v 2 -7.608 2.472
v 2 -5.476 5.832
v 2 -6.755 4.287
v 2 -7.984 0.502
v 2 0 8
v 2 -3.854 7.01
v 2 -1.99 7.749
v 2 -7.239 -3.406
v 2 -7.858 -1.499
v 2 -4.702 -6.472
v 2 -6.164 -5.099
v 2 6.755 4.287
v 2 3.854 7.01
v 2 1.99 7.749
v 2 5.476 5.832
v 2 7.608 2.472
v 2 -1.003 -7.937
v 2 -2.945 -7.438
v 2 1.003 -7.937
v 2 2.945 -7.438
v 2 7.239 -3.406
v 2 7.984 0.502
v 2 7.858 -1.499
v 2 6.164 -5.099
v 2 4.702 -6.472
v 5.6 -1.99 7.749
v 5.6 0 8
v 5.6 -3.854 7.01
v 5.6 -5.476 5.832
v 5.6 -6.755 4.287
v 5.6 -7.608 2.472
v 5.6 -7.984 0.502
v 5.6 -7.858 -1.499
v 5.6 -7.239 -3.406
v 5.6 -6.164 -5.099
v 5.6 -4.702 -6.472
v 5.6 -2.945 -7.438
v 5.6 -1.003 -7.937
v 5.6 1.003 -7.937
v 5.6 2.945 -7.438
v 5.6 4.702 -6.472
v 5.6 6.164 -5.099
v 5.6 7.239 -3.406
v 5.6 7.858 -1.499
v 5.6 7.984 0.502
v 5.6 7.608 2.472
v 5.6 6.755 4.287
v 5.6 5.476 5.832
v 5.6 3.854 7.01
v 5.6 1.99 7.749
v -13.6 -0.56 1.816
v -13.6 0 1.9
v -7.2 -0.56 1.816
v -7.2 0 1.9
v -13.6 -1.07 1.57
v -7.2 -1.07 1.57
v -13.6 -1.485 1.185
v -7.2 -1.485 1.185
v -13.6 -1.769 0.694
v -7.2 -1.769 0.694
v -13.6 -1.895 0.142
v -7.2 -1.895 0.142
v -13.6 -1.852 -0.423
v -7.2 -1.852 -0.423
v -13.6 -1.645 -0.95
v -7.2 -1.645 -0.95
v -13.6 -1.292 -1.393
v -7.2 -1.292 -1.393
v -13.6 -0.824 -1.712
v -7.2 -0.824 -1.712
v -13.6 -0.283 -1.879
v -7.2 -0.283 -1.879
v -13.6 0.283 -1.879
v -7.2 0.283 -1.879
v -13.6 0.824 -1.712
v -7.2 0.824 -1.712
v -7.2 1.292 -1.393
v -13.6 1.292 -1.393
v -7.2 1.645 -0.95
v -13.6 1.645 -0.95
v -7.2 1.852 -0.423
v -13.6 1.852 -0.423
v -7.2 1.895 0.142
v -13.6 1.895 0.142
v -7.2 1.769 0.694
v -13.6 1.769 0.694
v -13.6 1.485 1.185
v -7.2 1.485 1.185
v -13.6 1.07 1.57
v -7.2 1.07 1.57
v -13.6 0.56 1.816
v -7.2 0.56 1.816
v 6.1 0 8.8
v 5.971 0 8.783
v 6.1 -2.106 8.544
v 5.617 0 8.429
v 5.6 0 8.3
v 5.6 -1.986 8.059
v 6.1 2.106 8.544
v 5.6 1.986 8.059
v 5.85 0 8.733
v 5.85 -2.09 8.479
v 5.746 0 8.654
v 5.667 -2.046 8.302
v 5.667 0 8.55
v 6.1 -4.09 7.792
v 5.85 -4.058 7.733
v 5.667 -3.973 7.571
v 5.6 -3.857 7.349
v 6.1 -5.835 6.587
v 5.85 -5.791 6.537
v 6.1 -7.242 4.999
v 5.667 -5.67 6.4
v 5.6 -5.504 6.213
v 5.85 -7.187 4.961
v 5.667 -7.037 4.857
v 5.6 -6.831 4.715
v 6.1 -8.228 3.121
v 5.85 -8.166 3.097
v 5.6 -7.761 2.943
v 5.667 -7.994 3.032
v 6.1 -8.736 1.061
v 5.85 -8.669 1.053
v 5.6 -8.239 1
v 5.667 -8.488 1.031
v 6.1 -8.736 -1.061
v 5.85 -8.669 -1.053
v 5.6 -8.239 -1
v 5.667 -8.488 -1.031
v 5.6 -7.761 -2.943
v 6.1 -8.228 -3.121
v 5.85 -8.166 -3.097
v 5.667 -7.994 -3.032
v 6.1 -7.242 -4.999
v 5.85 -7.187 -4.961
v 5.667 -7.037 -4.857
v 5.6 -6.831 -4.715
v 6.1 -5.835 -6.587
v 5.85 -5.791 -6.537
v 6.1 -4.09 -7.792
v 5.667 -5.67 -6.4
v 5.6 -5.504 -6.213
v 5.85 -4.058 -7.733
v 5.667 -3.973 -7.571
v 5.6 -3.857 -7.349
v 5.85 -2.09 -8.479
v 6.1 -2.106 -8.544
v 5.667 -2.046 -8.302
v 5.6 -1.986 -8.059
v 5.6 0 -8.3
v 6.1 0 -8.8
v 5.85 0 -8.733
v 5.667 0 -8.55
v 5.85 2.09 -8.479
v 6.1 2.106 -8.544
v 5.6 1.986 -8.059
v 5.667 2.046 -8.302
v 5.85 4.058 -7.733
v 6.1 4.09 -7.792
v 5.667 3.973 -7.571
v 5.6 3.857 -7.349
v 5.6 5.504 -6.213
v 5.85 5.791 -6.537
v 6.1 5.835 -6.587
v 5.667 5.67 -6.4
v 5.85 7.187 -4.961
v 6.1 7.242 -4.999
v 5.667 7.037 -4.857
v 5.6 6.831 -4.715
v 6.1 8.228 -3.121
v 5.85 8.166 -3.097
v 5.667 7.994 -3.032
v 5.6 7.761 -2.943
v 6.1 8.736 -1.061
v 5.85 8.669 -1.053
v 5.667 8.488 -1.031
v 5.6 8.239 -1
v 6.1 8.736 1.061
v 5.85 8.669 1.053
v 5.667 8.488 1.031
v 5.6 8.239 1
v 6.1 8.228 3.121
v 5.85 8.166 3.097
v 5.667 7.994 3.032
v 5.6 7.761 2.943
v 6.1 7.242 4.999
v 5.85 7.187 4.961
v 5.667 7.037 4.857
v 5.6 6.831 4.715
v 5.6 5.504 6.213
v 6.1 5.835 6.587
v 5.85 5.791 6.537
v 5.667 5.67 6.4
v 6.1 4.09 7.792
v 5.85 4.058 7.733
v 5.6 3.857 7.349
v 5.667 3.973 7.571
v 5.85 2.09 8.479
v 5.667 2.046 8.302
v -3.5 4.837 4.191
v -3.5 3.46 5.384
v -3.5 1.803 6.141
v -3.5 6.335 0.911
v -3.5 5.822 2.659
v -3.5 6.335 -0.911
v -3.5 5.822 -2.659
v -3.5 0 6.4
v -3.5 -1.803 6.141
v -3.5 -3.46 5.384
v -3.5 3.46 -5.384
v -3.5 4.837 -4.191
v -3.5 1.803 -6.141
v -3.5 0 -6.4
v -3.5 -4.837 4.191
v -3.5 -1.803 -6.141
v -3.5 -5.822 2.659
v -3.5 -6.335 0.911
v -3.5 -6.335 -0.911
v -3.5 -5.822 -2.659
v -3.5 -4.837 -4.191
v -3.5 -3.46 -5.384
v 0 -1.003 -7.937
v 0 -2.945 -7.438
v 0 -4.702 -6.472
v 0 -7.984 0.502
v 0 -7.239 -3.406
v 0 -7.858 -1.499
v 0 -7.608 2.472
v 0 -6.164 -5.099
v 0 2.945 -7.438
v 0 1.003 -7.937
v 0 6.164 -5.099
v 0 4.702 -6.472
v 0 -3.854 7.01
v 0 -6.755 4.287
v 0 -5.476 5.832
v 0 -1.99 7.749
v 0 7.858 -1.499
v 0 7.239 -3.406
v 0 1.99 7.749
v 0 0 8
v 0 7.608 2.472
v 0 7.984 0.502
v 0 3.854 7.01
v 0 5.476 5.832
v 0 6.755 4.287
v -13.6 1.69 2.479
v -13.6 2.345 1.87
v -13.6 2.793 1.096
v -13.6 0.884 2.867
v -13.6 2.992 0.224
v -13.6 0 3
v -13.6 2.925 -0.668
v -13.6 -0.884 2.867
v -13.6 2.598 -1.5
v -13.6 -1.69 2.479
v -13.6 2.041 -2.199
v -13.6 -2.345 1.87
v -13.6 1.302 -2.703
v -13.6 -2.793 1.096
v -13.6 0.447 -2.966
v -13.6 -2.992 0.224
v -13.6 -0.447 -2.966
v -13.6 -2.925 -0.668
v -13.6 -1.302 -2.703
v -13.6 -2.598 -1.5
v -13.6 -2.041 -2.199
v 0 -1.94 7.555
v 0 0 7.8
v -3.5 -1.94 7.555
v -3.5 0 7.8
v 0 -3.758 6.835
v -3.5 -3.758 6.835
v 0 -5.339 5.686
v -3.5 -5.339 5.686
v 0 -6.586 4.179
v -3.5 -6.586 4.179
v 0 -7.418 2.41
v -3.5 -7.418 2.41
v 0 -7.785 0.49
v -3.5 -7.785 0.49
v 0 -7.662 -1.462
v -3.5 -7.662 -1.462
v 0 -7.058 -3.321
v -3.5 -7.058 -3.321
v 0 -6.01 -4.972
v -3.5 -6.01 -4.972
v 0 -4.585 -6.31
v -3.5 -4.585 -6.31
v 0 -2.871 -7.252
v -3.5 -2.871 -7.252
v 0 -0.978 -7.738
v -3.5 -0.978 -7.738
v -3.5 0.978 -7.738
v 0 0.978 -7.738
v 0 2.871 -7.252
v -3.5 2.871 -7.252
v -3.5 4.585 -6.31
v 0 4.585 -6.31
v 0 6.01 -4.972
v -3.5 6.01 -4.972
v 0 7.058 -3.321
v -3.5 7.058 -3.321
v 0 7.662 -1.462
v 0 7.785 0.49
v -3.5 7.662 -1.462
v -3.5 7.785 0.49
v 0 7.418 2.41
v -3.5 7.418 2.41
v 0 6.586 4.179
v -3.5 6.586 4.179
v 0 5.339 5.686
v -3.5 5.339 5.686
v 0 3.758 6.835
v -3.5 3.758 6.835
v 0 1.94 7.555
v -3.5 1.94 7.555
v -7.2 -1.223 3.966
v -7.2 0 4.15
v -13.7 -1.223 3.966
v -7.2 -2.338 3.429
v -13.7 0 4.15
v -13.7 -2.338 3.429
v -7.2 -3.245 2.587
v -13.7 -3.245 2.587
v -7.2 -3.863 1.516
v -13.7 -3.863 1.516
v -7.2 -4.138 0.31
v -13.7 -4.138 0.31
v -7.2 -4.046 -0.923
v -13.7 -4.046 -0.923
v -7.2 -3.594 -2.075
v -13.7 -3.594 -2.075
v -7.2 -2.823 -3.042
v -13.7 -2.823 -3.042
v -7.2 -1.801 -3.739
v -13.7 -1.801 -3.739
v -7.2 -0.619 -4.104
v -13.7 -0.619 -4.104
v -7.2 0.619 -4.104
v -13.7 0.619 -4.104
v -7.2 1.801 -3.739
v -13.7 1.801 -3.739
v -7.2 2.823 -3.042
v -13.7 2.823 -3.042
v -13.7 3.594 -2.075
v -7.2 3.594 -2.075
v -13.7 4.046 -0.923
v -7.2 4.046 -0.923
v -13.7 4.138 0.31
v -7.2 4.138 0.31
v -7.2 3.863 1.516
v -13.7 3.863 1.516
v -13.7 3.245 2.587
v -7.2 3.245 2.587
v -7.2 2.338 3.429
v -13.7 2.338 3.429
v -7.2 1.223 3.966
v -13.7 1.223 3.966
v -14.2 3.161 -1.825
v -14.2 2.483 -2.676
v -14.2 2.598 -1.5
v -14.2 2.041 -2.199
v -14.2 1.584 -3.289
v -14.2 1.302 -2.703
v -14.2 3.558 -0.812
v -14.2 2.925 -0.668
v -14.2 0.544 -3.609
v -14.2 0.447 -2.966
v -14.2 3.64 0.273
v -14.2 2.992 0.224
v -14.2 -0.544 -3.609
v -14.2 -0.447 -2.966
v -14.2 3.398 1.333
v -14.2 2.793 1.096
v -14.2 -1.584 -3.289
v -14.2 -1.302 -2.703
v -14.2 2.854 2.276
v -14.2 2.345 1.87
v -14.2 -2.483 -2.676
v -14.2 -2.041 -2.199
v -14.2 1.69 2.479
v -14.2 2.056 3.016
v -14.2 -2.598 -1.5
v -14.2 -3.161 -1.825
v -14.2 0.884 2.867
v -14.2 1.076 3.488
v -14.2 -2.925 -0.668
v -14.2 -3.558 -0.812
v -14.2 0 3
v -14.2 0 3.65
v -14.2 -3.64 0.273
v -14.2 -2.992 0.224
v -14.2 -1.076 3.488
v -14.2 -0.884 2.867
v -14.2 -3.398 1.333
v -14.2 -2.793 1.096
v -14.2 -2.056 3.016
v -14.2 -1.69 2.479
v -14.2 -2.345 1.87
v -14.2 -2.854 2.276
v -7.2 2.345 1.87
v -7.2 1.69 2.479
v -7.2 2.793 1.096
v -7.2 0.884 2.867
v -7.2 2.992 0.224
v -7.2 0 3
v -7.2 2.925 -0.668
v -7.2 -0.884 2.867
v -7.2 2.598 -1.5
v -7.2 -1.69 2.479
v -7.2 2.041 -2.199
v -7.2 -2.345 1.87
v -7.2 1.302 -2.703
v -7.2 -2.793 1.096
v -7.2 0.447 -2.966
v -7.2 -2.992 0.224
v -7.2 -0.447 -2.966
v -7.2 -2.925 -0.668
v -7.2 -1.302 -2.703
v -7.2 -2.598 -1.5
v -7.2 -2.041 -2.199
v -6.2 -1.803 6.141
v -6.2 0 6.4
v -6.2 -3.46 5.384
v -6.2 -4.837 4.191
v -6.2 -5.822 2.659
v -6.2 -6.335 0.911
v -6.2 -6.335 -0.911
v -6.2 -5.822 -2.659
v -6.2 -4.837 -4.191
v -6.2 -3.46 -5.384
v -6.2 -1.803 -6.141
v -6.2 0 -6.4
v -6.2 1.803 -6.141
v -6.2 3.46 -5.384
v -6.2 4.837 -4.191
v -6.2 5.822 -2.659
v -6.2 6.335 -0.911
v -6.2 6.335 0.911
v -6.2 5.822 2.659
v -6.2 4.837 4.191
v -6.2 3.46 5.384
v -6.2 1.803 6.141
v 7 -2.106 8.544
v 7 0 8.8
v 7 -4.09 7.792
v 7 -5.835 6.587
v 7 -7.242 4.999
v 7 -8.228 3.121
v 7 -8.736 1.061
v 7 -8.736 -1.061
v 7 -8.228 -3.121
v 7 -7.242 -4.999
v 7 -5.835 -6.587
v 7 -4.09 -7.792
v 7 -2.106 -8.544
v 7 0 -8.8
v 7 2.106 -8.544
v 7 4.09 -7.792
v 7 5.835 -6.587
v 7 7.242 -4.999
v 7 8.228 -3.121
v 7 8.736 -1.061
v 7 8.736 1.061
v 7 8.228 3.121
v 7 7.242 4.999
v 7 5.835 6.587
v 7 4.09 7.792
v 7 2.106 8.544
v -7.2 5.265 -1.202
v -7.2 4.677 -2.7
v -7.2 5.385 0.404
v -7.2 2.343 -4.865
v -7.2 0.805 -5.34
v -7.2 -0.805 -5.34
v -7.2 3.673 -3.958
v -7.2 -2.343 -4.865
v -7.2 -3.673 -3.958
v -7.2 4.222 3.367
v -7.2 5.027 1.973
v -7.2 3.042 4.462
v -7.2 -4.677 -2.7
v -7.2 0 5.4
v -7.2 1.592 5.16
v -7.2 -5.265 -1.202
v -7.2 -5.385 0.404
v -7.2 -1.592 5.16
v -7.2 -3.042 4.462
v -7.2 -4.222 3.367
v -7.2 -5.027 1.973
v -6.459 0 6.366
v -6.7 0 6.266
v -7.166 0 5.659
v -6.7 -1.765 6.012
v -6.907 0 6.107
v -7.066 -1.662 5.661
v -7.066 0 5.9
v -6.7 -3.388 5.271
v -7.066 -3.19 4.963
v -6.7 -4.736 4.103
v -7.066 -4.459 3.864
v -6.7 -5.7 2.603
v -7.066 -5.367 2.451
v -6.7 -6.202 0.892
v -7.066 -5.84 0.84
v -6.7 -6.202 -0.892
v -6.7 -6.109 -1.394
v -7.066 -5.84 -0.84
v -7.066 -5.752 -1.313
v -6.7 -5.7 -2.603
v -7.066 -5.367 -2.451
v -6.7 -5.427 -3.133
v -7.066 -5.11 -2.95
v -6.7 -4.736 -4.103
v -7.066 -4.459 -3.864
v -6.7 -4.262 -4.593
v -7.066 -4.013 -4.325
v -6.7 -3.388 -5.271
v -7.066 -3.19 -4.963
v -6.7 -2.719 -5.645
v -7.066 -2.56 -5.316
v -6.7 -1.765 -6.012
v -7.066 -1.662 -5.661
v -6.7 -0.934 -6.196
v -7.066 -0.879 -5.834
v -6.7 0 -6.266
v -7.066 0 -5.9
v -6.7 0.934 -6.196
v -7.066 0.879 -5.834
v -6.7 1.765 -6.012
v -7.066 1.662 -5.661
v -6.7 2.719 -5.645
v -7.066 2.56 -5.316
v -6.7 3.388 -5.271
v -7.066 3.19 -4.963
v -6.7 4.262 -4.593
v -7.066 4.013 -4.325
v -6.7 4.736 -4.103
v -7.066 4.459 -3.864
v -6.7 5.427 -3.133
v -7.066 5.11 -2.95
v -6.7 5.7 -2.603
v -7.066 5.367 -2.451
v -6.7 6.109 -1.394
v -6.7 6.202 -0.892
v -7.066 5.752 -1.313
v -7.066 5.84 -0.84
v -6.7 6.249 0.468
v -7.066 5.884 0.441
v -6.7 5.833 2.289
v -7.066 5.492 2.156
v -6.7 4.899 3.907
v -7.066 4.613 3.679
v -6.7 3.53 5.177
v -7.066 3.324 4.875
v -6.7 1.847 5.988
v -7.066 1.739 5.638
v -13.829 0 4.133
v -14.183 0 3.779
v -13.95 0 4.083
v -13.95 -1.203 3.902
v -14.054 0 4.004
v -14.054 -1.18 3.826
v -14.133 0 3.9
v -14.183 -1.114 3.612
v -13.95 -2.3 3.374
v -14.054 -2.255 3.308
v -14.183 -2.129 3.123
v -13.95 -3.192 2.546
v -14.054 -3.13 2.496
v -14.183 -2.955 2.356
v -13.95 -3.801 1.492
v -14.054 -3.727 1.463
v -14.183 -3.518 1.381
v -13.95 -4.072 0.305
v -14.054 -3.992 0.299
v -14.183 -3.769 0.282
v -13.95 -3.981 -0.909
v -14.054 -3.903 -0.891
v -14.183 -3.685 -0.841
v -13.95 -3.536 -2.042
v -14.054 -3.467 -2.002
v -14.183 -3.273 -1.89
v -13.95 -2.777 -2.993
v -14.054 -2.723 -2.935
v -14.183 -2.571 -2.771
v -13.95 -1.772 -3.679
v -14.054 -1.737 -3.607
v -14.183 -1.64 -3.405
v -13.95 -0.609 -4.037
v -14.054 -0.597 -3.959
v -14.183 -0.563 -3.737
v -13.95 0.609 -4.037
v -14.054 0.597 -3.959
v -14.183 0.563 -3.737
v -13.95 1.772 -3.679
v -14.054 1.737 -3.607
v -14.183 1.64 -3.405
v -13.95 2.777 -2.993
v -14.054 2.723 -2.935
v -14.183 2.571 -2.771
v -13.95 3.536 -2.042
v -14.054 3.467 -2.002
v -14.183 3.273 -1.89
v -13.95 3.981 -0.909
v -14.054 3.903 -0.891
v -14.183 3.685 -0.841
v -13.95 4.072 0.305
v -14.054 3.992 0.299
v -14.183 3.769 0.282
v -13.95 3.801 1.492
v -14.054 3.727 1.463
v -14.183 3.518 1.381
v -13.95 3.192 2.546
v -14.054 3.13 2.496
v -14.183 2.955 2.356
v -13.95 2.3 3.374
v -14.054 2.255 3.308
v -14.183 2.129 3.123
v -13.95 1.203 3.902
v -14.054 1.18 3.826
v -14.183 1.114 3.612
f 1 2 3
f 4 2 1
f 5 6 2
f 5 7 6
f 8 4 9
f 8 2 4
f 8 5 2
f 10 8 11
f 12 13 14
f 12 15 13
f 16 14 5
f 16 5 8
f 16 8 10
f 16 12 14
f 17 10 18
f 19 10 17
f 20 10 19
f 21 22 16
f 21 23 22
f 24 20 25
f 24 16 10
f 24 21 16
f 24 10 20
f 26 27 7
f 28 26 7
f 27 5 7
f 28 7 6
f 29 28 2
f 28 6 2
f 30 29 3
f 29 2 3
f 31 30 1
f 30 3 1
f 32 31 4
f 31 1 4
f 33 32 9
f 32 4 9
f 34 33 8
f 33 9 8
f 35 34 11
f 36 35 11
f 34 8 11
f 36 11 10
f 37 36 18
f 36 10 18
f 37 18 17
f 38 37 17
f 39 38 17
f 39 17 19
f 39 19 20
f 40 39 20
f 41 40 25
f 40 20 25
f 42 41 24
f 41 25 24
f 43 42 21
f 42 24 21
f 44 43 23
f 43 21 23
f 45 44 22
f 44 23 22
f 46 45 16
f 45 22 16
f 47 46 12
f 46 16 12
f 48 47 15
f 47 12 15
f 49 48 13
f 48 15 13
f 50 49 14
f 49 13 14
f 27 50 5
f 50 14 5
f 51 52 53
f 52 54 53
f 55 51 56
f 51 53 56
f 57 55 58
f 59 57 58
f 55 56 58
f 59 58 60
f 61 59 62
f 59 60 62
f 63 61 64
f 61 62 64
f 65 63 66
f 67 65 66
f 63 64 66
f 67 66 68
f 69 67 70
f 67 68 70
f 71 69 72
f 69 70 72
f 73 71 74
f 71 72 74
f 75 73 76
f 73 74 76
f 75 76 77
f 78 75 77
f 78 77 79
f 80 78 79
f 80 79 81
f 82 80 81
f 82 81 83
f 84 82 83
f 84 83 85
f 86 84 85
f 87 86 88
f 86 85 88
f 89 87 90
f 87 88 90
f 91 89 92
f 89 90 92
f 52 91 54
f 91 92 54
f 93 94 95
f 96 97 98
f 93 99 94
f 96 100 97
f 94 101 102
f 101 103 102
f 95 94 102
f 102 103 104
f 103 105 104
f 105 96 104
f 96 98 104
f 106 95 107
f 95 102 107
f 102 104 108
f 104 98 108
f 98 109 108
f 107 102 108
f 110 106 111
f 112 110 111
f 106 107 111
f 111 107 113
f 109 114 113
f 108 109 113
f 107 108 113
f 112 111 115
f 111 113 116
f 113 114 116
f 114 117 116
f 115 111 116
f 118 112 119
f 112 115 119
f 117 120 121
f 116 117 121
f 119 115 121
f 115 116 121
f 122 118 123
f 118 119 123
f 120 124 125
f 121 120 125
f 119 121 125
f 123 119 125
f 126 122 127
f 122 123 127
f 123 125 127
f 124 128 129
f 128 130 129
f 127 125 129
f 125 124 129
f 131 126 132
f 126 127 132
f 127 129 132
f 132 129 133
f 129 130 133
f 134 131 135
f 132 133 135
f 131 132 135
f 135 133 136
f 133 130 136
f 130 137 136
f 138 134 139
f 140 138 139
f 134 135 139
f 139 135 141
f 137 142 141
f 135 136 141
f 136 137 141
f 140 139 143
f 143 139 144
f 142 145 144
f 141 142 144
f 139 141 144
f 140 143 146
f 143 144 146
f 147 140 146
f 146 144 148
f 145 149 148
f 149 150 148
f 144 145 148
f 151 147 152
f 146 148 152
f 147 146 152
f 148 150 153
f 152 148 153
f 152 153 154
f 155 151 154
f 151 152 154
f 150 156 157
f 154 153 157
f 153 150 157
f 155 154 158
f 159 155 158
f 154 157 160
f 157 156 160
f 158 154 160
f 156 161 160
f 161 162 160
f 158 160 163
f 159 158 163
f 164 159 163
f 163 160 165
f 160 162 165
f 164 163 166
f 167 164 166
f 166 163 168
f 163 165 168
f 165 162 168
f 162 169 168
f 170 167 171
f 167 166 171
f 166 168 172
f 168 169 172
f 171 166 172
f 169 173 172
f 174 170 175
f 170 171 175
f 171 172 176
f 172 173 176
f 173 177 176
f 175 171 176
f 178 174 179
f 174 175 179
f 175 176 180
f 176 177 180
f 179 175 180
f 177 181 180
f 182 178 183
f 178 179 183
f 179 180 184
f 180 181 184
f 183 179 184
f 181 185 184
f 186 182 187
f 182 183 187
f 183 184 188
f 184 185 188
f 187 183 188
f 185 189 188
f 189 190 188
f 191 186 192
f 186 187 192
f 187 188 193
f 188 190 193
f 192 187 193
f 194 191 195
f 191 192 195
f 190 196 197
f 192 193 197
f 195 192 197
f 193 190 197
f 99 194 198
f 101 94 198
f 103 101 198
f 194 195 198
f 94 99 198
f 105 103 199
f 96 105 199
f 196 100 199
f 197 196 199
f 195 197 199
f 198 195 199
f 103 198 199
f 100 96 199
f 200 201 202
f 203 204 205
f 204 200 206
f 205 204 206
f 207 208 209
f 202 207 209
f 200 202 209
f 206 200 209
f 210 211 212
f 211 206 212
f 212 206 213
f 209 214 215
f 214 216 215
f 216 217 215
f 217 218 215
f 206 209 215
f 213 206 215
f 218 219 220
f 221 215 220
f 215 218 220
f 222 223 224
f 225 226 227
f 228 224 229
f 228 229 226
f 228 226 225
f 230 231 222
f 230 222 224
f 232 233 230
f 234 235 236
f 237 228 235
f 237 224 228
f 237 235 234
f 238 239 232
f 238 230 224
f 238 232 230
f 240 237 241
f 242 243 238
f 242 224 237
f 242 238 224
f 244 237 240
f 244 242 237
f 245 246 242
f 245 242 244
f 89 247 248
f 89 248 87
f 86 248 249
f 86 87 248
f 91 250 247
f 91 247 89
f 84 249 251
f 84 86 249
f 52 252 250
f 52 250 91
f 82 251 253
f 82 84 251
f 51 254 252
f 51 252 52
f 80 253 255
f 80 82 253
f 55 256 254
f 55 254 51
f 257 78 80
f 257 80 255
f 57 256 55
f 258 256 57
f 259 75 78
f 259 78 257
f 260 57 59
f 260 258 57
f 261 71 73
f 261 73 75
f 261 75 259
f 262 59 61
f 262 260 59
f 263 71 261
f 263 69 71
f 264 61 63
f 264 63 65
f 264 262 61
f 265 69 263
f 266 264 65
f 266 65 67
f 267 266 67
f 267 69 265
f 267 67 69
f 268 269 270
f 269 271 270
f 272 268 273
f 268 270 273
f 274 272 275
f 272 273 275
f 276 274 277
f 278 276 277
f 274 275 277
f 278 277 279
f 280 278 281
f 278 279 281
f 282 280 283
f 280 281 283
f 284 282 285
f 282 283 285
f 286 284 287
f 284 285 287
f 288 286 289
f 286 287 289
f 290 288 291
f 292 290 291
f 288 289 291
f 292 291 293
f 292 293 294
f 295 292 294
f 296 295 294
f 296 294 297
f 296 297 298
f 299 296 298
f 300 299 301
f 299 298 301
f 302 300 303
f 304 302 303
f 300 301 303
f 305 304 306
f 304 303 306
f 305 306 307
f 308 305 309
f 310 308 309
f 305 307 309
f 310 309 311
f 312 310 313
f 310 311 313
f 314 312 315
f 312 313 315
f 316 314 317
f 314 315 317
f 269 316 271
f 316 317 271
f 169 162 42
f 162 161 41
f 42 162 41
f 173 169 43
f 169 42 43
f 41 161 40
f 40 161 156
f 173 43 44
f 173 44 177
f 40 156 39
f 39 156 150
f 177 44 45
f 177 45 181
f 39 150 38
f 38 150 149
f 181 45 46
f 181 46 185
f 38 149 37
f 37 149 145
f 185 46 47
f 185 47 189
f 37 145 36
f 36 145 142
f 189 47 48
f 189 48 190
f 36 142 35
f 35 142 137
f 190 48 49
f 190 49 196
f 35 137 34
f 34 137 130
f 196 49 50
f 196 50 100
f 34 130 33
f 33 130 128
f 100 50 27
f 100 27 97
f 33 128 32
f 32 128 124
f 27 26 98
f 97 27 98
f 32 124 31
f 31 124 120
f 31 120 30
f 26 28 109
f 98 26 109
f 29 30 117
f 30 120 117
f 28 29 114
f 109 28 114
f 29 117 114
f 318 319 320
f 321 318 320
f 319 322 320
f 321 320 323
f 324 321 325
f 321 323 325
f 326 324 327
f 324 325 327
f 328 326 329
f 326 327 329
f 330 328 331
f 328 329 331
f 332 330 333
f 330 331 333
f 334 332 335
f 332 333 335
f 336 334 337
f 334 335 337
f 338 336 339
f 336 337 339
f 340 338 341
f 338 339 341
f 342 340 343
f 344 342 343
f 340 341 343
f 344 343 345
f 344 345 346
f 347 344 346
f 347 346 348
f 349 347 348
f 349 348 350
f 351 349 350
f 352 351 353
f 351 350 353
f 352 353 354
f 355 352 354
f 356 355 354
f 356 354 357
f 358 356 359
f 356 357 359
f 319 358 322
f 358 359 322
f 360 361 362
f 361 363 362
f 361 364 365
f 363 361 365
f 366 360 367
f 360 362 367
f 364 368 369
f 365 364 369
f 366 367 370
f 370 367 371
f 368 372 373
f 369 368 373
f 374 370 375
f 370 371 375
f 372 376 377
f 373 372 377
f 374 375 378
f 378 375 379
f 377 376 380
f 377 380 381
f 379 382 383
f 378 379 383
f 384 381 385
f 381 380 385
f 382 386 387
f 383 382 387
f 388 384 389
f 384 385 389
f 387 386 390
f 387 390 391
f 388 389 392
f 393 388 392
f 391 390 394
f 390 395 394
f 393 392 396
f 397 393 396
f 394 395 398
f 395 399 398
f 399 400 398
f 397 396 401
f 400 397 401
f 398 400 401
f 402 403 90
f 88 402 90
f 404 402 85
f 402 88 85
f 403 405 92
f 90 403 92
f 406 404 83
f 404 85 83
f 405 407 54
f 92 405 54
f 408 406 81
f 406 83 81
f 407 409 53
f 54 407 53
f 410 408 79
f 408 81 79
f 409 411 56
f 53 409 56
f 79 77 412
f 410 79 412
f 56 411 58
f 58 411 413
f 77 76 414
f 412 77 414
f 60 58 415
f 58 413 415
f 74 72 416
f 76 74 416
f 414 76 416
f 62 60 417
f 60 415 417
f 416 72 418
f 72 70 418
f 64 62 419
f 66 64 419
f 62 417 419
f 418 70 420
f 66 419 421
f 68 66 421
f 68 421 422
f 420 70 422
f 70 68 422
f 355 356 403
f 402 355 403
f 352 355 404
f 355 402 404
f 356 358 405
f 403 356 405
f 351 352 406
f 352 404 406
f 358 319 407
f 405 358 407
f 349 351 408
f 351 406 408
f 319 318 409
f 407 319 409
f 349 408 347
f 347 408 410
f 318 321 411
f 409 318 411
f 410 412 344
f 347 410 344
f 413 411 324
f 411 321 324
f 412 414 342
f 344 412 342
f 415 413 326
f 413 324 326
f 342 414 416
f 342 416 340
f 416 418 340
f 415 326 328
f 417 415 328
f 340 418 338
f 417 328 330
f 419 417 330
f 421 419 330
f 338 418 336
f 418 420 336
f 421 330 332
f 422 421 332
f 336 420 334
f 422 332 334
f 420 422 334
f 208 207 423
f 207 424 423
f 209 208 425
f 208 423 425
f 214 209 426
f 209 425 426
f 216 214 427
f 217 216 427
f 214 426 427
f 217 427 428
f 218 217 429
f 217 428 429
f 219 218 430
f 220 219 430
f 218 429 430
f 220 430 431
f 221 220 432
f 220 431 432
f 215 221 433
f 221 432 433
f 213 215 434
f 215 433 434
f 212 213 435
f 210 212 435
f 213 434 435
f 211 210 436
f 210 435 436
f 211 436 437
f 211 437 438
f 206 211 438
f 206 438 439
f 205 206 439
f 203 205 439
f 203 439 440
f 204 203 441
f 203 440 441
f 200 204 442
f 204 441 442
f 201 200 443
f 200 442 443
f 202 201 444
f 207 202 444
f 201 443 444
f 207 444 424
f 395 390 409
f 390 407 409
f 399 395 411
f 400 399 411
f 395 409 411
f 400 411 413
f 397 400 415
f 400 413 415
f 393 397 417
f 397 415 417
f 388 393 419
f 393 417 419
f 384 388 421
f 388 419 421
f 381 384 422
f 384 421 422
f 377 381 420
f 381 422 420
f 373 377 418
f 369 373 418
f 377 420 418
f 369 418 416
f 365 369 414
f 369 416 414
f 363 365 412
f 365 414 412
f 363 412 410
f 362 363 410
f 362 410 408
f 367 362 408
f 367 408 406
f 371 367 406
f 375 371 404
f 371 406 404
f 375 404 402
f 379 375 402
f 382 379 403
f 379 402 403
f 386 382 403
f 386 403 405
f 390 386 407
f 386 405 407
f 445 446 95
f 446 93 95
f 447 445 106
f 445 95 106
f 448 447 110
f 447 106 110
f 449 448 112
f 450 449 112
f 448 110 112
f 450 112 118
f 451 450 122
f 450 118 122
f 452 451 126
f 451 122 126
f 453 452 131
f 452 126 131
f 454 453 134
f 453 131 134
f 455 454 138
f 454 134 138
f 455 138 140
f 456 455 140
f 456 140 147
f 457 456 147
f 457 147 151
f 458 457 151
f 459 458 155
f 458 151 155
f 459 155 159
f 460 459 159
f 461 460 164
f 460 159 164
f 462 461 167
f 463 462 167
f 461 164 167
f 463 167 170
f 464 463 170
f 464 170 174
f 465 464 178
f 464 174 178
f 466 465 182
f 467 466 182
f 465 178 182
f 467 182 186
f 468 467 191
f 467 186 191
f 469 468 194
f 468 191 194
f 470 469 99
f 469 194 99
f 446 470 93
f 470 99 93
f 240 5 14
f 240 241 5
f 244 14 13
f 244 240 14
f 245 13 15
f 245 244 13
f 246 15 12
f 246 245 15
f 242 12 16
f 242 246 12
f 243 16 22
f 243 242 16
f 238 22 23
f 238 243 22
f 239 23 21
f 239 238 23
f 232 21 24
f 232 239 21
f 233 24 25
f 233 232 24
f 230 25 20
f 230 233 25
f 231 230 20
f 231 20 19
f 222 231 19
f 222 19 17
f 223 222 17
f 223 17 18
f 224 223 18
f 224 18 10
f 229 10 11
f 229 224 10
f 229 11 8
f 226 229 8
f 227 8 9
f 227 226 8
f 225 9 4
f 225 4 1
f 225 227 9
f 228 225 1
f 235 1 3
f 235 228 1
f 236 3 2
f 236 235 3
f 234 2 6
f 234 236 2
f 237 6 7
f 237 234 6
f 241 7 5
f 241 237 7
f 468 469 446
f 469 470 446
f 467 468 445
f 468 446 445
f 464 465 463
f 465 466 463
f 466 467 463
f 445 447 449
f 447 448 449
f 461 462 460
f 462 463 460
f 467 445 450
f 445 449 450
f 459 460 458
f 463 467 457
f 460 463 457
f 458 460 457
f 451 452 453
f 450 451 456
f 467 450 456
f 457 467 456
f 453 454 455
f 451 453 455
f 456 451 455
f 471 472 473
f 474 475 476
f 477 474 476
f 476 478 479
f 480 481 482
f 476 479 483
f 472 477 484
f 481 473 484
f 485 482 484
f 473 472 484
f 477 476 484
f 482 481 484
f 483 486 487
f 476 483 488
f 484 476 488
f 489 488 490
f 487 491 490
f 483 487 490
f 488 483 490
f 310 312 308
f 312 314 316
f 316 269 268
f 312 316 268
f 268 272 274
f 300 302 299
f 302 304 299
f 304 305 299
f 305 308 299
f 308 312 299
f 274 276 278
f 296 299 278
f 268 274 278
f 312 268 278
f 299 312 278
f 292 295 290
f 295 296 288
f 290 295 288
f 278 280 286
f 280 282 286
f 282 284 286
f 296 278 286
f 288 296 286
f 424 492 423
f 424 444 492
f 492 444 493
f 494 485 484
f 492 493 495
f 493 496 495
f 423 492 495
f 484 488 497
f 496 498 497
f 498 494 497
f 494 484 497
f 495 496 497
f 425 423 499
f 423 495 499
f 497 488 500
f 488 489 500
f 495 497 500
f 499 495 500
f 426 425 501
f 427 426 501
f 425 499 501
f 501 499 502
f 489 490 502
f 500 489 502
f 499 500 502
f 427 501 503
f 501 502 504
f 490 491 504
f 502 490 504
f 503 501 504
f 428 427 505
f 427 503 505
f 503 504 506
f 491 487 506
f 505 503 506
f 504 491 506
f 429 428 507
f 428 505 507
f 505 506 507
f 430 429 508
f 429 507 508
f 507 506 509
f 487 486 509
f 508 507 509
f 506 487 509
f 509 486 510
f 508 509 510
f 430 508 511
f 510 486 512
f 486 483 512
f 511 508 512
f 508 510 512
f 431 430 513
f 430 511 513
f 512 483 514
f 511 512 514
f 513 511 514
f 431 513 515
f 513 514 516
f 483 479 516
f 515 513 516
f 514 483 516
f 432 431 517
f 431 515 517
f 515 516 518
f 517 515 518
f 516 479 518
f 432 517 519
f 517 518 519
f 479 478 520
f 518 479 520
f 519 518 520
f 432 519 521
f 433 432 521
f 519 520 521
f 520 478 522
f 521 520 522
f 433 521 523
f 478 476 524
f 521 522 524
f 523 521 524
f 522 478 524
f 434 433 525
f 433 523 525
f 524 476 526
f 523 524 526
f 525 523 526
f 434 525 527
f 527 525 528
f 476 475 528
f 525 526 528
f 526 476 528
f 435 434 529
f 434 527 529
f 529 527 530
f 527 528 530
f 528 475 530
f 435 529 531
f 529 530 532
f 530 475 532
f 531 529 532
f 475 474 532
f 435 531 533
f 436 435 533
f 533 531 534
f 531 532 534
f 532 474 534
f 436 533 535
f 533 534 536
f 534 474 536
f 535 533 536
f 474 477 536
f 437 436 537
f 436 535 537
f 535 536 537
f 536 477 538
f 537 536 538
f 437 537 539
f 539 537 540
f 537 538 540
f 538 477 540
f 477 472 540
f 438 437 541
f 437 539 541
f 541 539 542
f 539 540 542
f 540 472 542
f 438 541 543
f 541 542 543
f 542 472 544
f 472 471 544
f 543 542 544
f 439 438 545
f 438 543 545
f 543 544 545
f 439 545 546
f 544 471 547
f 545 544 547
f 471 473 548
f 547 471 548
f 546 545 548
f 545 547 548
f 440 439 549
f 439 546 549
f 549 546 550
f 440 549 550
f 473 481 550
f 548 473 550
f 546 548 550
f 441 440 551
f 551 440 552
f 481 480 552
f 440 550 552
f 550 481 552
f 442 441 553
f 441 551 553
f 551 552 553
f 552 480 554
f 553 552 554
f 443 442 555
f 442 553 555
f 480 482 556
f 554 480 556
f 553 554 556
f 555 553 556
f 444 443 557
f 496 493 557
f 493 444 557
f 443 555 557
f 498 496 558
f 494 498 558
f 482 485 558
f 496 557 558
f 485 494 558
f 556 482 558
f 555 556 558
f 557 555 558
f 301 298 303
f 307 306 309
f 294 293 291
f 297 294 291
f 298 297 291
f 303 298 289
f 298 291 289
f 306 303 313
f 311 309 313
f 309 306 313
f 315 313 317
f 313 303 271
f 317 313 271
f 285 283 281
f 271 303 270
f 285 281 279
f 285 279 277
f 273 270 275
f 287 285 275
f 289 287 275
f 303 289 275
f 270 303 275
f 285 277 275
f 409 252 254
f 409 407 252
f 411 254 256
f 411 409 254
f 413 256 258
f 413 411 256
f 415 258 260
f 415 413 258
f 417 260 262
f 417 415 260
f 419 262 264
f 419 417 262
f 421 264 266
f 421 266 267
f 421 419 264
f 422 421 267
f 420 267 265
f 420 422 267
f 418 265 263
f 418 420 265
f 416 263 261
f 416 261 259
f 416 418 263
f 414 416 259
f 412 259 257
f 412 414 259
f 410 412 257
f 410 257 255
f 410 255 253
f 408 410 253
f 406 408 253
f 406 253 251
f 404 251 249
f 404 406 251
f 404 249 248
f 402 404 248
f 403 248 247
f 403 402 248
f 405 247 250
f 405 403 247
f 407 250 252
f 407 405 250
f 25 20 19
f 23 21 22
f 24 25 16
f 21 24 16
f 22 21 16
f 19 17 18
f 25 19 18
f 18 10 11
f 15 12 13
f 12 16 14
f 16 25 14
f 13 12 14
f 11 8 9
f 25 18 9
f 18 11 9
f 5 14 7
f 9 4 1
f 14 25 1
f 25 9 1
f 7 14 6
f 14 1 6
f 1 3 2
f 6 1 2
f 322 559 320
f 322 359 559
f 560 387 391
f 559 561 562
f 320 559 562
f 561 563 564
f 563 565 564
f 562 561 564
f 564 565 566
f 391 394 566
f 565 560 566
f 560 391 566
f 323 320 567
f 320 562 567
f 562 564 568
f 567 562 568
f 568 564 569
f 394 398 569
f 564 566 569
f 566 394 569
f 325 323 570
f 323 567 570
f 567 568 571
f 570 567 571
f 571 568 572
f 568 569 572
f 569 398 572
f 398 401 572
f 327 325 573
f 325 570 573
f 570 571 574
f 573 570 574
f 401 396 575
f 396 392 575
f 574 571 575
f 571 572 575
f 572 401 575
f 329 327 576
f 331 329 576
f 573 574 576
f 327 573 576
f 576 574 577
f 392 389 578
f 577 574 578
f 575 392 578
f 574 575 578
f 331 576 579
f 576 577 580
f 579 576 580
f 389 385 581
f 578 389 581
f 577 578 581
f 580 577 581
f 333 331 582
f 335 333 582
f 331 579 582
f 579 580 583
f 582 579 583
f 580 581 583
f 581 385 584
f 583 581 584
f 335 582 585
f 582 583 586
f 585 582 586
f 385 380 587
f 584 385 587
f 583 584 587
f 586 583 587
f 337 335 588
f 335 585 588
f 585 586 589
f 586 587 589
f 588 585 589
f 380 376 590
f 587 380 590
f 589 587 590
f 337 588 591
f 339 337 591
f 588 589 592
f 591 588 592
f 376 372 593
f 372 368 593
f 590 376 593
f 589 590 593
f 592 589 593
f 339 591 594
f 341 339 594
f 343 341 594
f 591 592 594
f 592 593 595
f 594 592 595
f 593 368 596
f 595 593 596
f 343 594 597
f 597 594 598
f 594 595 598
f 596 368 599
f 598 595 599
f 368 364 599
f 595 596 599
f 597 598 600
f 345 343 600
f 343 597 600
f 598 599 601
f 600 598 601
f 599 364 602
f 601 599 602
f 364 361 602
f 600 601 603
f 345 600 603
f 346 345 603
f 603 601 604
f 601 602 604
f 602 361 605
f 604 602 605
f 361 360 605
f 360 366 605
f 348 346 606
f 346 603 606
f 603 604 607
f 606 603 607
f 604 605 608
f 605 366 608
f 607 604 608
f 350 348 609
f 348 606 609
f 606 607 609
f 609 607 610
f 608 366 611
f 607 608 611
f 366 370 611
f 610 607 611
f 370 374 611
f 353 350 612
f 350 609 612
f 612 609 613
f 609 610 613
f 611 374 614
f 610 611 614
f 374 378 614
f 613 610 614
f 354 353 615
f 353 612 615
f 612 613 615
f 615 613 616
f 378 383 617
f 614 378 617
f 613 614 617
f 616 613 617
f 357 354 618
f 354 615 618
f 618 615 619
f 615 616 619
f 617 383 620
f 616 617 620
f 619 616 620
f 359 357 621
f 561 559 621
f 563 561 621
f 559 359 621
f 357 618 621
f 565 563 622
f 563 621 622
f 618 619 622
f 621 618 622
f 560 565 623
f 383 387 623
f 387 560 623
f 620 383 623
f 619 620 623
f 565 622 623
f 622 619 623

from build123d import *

# Parameters (mm, degrees)
F0_W = 6.4
F0_H = 1.1


with BuildPart() as f1:
    # F0 (on Front) → F1 (revolve)
    with BuildSketch(Plane.XZ):
        with BuildLine():
            Line((-7.2, 3), (-7.2, 4.15))
            Line((-7.2, 4.15), (-13.7, 4.15))
            ThreePointArc((-13.7, 4.15), (-14.053553, 4.003553), (-14.2, 3.65))
            Line((-14.2, 3.65), (-14.2, 3))
            Line((-14.2, 3), (-13.6, 3))
            Line((-13.6, 3), (-7.2, 3))
        make_face()
    revolve(axis=Axis((-1.512052, 0, 0), (1, 0, 0)))


with BuildPart() as f2:
    # F0 (on Front) → F2 (revolve)
    with BuildSketch(Plane.XZ):
        with BuildLine():
            Line((-3.5, 0), (-3.5, 6.4))
            Line((-3.5, 6.4), (-6.2, 6.4))
            ThreePointArc((-6.2, 6.4), (-6.907107, 6.107107), (-7.2, 5.4))
            Line((-7.2, 5.4), (-7.2, 4.15))
            Line((-7.2, 4.15), (-7.2, 3))
            Line((-7.2, 3), (-7.2, 1.9))
            Line((-7.2, 1.9), (-7.2, 0))
            Line((-7.2, 0), (-3.5, 0))
        make_face()
    revolve(axis=Axis((-5.35, 0, 0), (1, 0, 0)))


with BuildPart() as f3:
    # F0 (on Front) → F3 (revolve)
    with BuildSketch(Plane.XZ):
        Polygon((0, 0), (0, 7.8), (-3.5, 7.8), (-3.5, 6.4), (-3.5, 0), align=None)
    revolve(axis=Axis((-1.75, 0, 0), (1, 0, 0)))


with BuildPart() as f4:
    # F0 (on Front) → F4 (revolve)
    with BuildSketch(Plane.XZ):
        Polygon((0, 8), (0, 7.8), (0, 0), (2, 0), (2, 8), align=None)
    revolve(axis=Axis((4.5, 0, 0), (-1, 0, 0)))


with BuildPart() as f5:
    # F0 (on Front) → F5 (revolve)
    with BuildSketch(Plane.XZ):
        with Locations((-10.4, 2.45)):
            Rectangle(F0_W, F0_H)
    revolve(axis=Axis((-1.512052, 0, 0), (1, 0, 0)))


with BuildPart() as f6:
    # F0 (on Front) → F6 (revolve)
    with BuildSketch(Plane.XZ):
        with BuildLine():
            Line((2, 8), (2, 0))
            Line((2, 0), (7, 0))
            Line((7, 0), (7, 8.8))
            Line((7, 8.8), (6.1, 8.8))
            ThreePointArc((6.1, 8.8), (5.746447, 8.653553), (5.6, 8.3))
            Line((5.6, 8.3), (5.6, 8))
            Line((5.6, 8), (2, 8))
        make_face()
    revolve(axis=Axis((-1.512052, 0, 0), (1, 0, 0)))


solid = Compound([f1.part, f2.part, f3.part, f4.part, f5.part, f6.part])
